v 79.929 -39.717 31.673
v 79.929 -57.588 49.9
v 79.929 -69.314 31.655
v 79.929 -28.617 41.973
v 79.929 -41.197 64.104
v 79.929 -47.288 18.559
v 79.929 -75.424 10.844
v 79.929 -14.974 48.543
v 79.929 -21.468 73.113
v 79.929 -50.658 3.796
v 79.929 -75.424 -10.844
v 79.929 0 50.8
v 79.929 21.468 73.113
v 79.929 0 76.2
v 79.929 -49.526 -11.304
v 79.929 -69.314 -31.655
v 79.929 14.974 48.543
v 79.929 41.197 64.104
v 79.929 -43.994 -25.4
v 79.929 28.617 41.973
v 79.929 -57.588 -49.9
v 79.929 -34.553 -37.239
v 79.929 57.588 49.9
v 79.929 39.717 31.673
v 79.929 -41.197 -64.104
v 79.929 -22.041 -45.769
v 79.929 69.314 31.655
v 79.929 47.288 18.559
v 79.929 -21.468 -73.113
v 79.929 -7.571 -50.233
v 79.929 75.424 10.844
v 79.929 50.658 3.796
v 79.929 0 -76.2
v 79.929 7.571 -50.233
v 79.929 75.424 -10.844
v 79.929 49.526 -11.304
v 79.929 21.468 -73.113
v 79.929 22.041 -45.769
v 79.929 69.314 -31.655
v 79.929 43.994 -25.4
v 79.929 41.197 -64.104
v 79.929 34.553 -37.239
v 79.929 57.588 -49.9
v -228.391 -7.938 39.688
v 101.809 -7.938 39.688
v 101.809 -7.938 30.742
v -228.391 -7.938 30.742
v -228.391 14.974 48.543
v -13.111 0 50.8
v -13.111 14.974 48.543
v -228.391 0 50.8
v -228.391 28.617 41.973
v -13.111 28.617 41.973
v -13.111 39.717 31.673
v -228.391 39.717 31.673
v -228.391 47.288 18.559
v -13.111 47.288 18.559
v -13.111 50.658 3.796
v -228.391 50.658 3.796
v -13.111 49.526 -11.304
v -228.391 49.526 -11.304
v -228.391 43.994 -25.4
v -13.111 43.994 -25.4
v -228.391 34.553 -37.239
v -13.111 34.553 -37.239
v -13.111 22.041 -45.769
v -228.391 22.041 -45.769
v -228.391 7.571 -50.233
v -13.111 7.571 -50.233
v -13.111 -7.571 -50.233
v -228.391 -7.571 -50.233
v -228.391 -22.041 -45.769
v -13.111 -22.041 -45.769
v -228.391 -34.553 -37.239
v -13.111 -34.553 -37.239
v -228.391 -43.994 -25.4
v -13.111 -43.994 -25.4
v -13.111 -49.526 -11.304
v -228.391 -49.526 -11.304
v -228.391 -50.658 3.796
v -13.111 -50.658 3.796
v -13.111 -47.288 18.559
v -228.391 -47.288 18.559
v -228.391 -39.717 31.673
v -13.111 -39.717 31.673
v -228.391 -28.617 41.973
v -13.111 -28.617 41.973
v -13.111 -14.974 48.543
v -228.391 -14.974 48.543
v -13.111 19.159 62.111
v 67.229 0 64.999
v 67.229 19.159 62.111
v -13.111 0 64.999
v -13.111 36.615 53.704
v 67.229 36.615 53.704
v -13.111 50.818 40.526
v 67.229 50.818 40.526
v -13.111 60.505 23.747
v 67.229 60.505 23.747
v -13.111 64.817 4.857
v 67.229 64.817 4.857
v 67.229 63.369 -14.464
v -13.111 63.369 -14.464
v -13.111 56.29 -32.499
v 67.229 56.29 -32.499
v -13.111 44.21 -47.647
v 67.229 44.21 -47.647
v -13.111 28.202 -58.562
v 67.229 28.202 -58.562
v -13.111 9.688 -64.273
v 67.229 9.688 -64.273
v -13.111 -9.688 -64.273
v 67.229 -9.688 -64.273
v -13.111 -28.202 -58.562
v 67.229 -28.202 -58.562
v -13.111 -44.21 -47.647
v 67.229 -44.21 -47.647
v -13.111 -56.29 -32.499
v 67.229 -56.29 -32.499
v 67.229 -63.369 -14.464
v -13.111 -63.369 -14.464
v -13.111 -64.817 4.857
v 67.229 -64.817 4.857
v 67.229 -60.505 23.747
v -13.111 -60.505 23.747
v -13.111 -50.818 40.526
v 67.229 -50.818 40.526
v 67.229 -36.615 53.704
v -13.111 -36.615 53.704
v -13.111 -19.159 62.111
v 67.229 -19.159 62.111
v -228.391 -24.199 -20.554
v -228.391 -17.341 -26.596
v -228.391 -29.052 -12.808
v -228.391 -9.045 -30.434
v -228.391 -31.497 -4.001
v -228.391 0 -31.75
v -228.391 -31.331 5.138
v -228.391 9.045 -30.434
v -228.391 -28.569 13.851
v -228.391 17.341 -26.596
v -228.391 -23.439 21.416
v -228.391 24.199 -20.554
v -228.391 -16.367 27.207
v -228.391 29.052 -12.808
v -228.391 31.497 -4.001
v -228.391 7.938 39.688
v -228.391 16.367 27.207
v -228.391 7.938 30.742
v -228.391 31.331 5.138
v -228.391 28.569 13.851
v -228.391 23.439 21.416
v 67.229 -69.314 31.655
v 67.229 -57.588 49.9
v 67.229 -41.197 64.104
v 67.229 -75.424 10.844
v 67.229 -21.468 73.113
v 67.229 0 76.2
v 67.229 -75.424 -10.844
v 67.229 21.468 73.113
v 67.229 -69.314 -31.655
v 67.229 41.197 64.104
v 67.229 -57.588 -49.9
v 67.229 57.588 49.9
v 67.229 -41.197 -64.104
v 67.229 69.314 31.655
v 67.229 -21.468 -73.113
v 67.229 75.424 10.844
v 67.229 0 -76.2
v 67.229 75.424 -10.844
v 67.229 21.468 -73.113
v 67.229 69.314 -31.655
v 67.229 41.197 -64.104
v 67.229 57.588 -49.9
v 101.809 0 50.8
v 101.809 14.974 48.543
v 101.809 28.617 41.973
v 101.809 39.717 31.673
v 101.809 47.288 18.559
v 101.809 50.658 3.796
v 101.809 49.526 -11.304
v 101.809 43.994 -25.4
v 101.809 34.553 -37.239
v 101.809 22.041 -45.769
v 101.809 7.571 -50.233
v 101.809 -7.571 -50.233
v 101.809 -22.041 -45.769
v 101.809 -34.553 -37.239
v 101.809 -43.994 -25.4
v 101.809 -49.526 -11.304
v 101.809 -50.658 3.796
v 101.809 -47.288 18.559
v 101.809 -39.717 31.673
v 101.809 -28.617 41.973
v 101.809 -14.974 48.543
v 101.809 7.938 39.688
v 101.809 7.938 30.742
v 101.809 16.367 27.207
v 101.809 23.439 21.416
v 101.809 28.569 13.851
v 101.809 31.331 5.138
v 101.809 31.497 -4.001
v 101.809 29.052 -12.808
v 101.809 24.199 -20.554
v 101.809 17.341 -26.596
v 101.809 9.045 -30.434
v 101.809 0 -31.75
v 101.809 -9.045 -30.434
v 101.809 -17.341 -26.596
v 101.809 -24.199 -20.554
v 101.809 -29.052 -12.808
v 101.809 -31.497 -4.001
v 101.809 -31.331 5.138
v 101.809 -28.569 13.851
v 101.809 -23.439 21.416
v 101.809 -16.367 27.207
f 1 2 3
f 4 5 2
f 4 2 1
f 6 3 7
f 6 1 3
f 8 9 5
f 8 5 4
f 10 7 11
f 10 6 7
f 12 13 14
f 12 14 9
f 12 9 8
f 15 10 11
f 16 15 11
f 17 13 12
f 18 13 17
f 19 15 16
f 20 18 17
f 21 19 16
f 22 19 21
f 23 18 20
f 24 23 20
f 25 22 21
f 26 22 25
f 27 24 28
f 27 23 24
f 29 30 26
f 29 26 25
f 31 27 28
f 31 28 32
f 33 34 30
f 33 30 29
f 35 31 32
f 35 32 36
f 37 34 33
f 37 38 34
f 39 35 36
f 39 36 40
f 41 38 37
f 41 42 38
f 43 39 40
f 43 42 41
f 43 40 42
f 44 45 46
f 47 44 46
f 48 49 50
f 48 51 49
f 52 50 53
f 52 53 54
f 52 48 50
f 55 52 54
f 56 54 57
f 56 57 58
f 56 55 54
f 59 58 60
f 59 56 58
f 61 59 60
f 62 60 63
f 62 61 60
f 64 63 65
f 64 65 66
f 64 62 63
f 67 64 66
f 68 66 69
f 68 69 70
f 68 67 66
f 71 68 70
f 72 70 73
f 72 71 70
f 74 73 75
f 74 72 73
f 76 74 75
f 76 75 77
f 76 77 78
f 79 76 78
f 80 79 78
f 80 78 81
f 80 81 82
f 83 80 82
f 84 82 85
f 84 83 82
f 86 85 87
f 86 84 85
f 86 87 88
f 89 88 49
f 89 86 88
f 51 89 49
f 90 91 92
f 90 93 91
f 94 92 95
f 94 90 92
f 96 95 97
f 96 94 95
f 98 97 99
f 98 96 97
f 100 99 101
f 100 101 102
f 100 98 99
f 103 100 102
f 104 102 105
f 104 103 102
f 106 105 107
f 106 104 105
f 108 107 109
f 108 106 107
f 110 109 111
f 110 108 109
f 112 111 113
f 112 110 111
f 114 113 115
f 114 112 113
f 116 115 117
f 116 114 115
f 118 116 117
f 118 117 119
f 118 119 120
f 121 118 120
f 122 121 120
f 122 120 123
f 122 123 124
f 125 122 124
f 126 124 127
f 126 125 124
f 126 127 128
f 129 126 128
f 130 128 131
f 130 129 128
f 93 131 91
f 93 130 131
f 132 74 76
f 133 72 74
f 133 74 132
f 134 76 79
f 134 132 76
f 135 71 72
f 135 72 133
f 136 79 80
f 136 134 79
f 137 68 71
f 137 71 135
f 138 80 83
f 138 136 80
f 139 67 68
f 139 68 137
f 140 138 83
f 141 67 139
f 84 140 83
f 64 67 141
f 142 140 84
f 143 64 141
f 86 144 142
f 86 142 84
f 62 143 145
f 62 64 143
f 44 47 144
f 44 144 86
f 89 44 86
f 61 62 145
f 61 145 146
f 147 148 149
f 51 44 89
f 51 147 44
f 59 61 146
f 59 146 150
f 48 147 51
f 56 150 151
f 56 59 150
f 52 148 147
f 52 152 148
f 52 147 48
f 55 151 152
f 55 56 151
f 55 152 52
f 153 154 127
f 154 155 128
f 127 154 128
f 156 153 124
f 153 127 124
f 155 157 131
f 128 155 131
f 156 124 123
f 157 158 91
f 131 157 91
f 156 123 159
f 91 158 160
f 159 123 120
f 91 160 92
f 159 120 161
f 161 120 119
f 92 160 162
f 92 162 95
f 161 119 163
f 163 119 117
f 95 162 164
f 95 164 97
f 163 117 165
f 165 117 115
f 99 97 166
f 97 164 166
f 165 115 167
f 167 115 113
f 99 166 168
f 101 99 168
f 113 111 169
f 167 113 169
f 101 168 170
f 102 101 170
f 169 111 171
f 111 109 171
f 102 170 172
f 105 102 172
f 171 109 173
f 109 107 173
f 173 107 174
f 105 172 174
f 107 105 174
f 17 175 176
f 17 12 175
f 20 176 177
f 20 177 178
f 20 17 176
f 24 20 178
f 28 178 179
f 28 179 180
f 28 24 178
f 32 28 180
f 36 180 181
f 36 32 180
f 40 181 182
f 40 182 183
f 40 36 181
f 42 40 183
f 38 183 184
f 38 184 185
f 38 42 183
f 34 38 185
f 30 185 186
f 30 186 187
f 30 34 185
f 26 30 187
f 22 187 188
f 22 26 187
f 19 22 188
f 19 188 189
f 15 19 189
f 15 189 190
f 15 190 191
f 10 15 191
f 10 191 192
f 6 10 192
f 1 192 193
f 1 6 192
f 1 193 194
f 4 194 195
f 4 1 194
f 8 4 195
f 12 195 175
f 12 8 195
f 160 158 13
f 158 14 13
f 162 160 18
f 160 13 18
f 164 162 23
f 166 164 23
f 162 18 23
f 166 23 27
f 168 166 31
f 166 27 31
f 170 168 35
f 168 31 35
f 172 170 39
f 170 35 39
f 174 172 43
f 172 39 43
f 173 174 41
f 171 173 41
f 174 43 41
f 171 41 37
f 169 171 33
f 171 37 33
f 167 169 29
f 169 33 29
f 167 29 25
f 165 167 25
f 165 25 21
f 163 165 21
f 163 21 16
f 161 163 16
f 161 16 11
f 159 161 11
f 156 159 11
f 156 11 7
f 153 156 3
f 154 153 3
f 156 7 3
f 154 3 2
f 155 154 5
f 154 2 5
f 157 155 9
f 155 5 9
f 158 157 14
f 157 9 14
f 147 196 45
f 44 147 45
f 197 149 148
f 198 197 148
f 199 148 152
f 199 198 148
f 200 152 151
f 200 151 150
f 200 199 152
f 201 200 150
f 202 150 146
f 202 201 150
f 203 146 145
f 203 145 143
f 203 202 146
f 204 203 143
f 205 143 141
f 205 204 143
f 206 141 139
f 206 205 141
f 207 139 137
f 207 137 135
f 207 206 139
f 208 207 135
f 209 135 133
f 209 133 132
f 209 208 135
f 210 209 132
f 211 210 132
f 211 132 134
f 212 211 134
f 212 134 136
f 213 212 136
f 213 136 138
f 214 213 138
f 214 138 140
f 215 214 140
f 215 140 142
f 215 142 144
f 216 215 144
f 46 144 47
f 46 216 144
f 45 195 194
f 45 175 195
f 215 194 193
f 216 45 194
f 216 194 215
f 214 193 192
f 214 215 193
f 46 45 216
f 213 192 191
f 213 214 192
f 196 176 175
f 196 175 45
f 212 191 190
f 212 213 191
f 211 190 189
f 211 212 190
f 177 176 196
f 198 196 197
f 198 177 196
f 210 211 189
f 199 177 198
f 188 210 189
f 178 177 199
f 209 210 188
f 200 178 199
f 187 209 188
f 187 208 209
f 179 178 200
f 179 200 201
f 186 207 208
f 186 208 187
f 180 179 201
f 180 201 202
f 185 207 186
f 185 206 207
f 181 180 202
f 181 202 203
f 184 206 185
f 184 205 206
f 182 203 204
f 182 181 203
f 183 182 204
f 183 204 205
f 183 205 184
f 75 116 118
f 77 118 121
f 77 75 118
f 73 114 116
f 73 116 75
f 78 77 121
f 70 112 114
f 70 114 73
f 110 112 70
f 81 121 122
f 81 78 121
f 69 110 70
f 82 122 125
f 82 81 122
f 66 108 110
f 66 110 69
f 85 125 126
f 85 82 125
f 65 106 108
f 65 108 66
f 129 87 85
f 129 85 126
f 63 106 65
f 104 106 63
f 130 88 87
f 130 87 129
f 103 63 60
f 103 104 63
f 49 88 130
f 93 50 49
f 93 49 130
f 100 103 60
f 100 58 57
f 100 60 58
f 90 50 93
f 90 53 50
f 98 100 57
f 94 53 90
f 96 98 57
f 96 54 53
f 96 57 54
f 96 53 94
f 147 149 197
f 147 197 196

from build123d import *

# Parameters (mm, degrees)
F0_W     = 12.7
F0_H     = 11.2014
F3_DEPTH = 330.2


with BuildPart() as f1:
    # F0 (on Front) → F1 (revolve)
    with BuildSketch(Plane.XZ):
        Polygon((-228.391013, 31.75), (101.808987, 31.75), (101.808987, 50.8), (79.929347, 50.8), (-13.110853, 50.8), (-228.391013, 50.8), align=None)
        Polygon((-13.110853, 50.8), (79.929347, 50.8), (79.929347, 64.9986), (67.229347, 64.9986), (-13.110853, 64.9986), align=None)
        with Locations((73.579347, 70.5993)):
            Rectangle(F0_W, F0_H)
    revolve(axis=Axis((-0.204857, 0, 0), (-1, 0, 0)))

    # F2 (on face) → F3 (cut)
    with BuildSketch(Plane.YZ.offset(101.808987)):
        with BuildLine():
            Line((7.9375, 30.741805), (7.9375, 39.6875))
            Line((7.9375, 39.6875), (-7.9375, 39.6875))
            Line((-7.9375, 39.6875), (-7.9375, 30.741805))
            ThreePointArc((-7.9375, 30.741805), (0, 31.75), (7.9375, 30.741805))
        make_face()
    extrude(amount=-F3_DEPTH, mode=Mode.SUBTRACT)


solid = f1.part
